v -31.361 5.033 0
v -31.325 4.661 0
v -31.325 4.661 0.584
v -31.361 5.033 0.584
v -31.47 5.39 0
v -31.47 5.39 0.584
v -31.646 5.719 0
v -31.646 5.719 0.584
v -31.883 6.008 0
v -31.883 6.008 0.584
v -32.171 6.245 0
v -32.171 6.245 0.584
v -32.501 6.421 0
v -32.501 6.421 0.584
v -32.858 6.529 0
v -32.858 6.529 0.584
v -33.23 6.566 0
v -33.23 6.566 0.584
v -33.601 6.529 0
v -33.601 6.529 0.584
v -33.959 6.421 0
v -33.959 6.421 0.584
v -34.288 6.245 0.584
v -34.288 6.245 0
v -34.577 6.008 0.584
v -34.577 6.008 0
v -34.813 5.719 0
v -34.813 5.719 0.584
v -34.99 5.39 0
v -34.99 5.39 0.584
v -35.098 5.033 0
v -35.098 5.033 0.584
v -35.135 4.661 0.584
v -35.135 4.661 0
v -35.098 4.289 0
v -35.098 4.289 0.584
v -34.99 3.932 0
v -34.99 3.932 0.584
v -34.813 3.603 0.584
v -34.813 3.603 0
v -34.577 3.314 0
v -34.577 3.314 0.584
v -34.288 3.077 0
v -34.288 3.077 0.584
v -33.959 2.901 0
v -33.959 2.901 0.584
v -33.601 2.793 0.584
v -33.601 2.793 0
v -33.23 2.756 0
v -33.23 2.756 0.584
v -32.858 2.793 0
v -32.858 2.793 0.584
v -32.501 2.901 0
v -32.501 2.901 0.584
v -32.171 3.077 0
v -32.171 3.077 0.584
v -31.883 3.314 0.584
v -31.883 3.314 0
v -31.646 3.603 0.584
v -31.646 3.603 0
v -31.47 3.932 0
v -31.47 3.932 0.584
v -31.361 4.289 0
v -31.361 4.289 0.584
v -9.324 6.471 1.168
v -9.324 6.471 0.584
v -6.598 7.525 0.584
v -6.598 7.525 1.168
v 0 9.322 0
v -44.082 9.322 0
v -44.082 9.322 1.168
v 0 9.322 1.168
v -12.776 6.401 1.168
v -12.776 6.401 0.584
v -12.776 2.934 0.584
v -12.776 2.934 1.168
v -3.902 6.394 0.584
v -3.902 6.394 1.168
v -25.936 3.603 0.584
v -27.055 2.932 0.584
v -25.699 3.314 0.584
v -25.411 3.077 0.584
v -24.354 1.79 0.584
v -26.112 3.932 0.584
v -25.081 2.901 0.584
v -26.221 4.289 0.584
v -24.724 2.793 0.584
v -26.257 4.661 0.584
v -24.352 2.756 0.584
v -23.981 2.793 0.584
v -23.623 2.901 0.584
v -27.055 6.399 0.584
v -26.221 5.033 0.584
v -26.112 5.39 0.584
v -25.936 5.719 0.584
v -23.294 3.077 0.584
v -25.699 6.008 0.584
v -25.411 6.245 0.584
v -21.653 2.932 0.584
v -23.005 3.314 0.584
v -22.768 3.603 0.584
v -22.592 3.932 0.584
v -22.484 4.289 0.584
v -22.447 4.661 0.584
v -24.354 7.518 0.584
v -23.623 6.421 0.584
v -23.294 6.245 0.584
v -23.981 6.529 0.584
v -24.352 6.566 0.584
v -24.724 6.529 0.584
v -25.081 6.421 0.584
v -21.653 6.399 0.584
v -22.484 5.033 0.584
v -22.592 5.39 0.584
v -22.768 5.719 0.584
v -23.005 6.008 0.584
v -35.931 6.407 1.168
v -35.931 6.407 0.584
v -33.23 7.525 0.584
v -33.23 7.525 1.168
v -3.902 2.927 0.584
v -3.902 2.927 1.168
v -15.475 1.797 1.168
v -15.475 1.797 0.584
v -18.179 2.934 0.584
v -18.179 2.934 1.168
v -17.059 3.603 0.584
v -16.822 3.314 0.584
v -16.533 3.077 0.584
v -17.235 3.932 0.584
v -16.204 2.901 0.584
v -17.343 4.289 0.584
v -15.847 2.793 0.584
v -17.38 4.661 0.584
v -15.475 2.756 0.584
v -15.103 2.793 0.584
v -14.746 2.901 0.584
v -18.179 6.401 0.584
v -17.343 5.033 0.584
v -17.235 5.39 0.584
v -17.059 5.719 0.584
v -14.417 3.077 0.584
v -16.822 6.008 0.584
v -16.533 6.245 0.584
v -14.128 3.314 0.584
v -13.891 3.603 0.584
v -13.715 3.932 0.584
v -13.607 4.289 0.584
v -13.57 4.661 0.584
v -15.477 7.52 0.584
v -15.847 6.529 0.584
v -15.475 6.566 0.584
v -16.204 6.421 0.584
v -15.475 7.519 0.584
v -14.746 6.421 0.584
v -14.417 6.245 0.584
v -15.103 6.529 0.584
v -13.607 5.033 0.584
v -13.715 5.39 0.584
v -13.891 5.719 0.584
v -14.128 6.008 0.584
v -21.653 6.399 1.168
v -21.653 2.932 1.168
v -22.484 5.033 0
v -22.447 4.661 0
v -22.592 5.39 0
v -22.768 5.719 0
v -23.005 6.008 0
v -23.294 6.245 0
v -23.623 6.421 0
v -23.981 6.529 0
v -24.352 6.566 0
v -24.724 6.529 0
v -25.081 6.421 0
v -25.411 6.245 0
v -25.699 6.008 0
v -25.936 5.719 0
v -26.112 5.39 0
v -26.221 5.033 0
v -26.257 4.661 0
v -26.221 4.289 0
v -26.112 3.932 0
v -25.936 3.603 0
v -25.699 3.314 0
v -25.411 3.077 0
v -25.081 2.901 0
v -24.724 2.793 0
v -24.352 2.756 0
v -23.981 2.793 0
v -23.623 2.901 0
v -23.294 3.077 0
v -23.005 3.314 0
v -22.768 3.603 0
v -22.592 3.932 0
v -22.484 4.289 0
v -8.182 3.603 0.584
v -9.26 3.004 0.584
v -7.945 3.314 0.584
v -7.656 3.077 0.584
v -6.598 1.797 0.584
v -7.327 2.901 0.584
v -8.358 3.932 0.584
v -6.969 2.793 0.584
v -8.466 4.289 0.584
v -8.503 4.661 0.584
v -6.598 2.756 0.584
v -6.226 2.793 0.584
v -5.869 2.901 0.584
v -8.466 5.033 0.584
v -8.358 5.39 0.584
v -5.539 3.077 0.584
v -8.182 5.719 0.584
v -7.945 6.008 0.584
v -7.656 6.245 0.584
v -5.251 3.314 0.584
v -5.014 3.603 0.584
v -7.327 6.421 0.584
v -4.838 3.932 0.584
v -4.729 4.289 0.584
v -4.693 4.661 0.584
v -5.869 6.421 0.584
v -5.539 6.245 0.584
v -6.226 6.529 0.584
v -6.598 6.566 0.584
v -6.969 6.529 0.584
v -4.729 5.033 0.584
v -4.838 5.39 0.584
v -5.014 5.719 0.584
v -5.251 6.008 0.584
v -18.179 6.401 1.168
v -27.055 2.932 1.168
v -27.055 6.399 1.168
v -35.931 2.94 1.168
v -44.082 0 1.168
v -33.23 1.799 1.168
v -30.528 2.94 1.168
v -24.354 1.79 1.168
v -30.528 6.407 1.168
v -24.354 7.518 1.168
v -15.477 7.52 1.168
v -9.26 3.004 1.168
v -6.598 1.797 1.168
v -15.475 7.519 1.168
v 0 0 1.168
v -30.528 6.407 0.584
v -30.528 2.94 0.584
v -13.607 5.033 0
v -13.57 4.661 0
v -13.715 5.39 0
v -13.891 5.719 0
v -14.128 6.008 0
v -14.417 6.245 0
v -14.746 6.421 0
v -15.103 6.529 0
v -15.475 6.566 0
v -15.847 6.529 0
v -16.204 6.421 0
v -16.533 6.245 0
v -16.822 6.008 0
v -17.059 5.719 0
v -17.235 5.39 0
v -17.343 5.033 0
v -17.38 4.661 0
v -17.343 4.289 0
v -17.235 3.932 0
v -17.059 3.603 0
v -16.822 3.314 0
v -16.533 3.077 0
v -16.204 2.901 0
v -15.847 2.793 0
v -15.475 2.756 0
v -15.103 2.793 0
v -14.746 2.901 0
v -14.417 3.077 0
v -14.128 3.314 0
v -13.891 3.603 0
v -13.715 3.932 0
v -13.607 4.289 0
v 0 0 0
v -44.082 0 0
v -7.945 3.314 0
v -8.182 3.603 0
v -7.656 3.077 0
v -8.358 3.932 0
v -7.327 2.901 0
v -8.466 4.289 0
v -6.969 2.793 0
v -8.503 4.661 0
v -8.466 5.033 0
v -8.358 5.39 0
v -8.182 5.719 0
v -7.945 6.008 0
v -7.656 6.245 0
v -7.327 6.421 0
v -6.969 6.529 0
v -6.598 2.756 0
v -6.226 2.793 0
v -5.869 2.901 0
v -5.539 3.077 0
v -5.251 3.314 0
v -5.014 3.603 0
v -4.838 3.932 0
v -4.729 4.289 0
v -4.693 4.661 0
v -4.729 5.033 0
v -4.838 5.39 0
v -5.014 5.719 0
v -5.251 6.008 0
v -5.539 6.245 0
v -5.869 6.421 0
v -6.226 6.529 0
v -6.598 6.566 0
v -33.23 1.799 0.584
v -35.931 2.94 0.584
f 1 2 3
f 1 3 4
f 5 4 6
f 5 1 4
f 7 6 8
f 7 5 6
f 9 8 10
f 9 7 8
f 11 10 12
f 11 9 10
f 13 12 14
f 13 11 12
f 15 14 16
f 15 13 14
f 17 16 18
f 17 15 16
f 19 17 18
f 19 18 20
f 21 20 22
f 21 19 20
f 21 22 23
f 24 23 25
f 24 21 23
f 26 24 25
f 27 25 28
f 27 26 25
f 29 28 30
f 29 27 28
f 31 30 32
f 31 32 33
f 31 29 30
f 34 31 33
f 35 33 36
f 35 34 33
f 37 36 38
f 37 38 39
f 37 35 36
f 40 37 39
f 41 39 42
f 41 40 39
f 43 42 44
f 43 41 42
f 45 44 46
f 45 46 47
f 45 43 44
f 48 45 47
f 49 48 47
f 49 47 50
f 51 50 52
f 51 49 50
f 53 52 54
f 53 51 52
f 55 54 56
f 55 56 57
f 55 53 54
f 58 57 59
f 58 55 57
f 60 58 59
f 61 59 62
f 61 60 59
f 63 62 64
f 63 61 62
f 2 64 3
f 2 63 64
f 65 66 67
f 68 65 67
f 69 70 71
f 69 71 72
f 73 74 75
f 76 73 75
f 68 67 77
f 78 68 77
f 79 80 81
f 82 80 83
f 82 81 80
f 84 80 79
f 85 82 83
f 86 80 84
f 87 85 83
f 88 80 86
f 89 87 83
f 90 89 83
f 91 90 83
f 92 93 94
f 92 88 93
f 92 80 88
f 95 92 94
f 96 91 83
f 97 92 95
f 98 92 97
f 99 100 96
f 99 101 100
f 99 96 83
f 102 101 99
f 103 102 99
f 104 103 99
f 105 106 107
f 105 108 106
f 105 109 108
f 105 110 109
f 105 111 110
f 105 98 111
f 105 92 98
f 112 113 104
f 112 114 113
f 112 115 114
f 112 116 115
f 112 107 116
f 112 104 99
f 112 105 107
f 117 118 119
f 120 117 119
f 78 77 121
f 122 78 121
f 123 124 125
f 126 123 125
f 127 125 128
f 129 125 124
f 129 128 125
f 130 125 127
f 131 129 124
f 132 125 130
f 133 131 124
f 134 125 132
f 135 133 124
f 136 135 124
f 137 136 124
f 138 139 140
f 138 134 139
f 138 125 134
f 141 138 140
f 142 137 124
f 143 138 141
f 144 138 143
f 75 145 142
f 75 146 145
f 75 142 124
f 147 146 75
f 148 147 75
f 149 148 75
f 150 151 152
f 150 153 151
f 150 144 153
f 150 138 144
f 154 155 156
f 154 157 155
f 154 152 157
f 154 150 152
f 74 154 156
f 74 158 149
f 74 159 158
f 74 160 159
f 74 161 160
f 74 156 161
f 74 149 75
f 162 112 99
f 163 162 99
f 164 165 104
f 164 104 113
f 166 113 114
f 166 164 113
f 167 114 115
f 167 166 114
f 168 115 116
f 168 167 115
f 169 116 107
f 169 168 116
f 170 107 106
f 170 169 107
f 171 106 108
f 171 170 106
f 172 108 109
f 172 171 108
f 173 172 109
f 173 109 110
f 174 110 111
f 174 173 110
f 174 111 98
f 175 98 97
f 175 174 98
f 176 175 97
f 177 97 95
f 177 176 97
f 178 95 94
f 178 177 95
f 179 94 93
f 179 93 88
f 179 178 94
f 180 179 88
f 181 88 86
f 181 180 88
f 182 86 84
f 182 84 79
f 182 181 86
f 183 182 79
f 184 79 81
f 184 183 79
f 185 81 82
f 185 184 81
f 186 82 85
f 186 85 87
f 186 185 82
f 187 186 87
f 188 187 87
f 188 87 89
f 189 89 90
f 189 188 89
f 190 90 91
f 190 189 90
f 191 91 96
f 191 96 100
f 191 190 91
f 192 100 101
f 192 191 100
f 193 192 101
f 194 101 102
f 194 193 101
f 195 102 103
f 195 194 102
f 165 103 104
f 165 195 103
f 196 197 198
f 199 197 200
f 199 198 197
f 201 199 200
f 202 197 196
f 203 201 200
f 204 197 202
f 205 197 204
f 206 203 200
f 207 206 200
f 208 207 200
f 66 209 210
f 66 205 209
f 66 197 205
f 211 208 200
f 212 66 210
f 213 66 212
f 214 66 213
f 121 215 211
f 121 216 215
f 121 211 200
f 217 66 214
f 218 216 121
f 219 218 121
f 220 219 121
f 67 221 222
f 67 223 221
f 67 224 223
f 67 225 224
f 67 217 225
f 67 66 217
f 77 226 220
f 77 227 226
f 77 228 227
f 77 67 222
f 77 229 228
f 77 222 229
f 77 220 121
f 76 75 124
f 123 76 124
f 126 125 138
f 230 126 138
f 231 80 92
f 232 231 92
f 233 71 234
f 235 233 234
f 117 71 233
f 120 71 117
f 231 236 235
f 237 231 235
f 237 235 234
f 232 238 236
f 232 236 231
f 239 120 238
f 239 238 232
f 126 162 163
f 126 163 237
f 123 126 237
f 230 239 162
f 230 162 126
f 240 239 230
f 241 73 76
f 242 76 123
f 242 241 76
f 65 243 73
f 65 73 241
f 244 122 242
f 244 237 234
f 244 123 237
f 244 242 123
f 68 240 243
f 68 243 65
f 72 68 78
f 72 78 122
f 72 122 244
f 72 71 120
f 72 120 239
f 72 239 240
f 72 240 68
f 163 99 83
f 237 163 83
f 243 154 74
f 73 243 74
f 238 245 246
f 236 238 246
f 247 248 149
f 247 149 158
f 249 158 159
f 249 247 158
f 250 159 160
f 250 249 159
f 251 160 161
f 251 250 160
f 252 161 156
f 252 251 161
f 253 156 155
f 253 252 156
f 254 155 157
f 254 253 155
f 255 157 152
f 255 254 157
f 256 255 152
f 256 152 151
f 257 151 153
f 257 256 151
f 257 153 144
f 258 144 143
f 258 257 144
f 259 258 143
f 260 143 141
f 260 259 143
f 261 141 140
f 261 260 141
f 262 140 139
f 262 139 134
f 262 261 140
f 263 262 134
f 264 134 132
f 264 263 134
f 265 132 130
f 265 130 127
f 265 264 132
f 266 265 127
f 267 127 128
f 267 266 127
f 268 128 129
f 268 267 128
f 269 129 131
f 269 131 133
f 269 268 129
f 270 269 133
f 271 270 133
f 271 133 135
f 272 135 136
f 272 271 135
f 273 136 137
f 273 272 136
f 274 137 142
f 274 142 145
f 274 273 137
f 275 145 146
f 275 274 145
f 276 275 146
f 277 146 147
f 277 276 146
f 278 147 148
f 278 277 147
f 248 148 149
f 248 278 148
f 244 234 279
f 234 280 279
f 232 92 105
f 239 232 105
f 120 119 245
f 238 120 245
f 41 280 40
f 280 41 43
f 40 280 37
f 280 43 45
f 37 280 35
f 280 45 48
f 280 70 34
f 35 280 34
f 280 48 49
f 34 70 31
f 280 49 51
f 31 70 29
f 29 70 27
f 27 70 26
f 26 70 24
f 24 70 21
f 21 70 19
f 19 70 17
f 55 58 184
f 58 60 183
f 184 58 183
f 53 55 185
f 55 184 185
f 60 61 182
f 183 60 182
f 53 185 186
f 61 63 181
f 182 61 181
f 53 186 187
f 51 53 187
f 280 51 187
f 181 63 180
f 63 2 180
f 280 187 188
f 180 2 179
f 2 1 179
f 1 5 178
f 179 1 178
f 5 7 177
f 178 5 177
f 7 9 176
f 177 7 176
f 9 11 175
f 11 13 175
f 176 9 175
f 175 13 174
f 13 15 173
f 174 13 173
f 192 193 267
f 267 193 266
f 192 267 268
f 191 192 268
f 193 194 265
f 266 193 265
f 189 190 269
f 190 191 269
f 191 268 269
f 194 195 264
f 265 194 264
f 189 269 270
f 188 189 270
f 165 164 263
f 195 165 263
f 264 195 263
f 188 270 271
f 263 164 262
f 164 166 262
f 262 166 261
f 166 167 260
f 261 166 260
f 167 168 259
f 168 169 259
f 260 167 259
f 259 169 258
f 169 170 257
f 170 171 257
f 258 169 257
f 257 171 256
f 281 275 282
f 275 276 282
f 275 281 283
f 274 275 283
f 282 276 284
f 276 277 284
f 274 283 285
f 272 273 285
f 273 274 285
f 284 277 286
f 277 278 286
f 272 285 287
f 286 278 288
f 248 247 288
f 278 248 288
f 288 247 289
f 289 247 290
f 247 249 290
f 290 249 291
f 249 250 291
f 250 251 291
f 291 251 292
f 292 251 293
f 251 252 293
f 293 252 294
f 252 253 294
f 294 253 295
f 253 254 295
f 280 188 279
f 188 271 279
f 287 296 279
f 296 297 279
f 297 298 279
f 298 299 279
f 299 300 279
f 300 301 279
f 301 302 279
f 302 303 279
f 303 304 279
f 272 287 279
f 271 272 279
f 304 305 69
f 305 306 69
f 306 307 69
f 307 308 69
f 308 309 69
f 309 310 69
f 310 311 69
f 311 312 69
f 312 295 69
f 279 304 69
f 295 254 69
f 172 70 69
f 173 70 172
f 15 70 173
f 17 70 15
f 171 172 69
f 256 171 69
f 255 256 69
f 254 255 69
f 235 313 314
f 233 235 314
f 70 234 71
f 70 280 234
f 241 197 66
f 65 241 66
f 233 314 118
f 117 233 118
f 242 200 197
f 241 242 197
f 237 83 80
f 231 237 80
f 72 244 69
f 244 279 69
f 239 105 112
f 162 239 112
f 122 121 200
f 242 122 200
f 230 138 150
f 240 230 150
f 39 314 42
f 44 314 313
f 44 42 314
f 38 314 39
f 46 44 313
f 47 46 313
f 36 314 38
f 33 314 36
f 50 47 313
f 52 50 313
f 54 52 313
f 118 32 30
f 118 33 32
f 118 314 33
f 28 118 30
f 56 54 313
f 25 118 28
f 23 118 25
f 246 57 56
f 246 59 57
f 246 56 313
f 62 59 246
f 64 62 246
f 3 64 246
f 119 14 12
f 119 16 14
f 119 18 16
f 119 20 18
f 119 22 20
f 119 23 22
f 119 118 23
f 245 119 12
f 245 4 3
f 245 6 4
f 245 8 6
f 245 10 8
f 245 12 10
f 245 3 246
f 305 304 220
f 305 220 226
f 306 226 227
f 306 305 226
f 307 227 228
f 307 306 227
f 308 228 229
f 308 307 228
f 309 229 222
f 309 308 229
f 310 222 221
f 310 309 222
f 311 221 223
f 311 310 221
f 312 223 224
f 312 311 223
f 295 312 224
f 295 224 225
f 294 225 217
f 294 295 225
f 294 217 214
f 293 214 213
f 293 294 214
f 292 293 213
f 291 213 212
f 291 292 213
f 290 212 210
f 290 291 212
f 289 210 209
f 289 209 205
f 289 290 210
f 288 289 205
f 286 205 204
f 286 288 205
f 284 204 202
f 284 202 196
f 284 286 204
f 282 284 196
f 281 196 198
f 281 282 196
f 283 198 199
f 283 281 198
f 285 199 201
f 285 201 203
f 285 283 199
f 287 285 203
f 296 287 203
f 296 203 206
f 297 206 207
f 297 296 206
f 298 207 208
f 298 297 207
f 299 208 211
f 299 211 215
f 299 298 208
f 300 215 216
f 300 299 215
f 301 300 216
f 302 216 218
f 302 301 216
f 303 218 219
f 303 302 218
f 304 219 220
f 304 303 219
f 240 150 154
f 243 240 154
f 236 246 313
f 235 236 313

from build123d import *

# Parameters (mm, degrees)
F0_W     = 44.0817
F0_H     = 9.3218
F0_R     = 1.905
F1_DEPTH = 0.5842
F2_W     = 44.0817
F2_H     = 9.3218
F3_DEPTH = 0.5842


with BuildPart() as f1:
    # F0 (on Top) → F1 (new body)
    with BuildSketch(Plane.XY):
        with Locations((-22.04085, 4.6609)):
            Rectangle(F0_W, F0_H)
        with Locations((-33.22955, 4.6609)):
            Circle(F0_R, mode=Mode.SUBTRACT)
        with Locations((-24.35225, 4.6609)):
            Circle(F0_R, mode=Mode.SUBTRACT)
        with Locations((-15.47495, 4.6609)):
            Circle(F0_R, mode=Mode.SUBTRACT)
        with Locations((-6.59765, 4.6609)):
            Circle(F0_R, mode=Mode.SUBTRACT)
    extrude(amount=F1_DEPTH)

    # F2 (on face) → F3 (join)
    with BuildSketch(Plane.XY.offset(0.5842)):
        with Locations((-22.04085, 4.6609)):
            Rectangle(F2_W, F2_H)
        Polygon((-27.055155, 2.931543), (-27.055155, 6.398643), (-24.35388, 7.517512), (-21.653151, 6.398869), (-21.653151, 2.931769), (-24.35388, 1.789812), align=None, mode=Mode.SUBTRACT)
        Polygon((-18.178729, 2.934289), (-18.178729, 6.401389), (-15.477454, 7.520258), (-15.47495, 7.519221), (-12.776178, 6.401393), (-12.776178, 2.934293), (-15.47495, 1.79705), align=None, mode=Mode.SUBTRACT)
        Polygon((-33.22955, 7.52475), (-30.528275, 6.407391), (-30.528275, 2.940291), (-33.22955, 1.79856), (-35.930825, 2.940291), (-35.930825, 6.407391), align=None, mode=Mode.SUBTRACT)
        Polygon((-9.259915, 3.004381), (-9.324309, 6.470883), (-6.59765, 7.52475), (-3.901778, 6.39445), (-3.901778, 2.92735), (-6.59765, 1.79705), align=None, mode=Mode.SUBTRACT)
    extrude(amount=F3_DEPTH)


solid = f1.part
